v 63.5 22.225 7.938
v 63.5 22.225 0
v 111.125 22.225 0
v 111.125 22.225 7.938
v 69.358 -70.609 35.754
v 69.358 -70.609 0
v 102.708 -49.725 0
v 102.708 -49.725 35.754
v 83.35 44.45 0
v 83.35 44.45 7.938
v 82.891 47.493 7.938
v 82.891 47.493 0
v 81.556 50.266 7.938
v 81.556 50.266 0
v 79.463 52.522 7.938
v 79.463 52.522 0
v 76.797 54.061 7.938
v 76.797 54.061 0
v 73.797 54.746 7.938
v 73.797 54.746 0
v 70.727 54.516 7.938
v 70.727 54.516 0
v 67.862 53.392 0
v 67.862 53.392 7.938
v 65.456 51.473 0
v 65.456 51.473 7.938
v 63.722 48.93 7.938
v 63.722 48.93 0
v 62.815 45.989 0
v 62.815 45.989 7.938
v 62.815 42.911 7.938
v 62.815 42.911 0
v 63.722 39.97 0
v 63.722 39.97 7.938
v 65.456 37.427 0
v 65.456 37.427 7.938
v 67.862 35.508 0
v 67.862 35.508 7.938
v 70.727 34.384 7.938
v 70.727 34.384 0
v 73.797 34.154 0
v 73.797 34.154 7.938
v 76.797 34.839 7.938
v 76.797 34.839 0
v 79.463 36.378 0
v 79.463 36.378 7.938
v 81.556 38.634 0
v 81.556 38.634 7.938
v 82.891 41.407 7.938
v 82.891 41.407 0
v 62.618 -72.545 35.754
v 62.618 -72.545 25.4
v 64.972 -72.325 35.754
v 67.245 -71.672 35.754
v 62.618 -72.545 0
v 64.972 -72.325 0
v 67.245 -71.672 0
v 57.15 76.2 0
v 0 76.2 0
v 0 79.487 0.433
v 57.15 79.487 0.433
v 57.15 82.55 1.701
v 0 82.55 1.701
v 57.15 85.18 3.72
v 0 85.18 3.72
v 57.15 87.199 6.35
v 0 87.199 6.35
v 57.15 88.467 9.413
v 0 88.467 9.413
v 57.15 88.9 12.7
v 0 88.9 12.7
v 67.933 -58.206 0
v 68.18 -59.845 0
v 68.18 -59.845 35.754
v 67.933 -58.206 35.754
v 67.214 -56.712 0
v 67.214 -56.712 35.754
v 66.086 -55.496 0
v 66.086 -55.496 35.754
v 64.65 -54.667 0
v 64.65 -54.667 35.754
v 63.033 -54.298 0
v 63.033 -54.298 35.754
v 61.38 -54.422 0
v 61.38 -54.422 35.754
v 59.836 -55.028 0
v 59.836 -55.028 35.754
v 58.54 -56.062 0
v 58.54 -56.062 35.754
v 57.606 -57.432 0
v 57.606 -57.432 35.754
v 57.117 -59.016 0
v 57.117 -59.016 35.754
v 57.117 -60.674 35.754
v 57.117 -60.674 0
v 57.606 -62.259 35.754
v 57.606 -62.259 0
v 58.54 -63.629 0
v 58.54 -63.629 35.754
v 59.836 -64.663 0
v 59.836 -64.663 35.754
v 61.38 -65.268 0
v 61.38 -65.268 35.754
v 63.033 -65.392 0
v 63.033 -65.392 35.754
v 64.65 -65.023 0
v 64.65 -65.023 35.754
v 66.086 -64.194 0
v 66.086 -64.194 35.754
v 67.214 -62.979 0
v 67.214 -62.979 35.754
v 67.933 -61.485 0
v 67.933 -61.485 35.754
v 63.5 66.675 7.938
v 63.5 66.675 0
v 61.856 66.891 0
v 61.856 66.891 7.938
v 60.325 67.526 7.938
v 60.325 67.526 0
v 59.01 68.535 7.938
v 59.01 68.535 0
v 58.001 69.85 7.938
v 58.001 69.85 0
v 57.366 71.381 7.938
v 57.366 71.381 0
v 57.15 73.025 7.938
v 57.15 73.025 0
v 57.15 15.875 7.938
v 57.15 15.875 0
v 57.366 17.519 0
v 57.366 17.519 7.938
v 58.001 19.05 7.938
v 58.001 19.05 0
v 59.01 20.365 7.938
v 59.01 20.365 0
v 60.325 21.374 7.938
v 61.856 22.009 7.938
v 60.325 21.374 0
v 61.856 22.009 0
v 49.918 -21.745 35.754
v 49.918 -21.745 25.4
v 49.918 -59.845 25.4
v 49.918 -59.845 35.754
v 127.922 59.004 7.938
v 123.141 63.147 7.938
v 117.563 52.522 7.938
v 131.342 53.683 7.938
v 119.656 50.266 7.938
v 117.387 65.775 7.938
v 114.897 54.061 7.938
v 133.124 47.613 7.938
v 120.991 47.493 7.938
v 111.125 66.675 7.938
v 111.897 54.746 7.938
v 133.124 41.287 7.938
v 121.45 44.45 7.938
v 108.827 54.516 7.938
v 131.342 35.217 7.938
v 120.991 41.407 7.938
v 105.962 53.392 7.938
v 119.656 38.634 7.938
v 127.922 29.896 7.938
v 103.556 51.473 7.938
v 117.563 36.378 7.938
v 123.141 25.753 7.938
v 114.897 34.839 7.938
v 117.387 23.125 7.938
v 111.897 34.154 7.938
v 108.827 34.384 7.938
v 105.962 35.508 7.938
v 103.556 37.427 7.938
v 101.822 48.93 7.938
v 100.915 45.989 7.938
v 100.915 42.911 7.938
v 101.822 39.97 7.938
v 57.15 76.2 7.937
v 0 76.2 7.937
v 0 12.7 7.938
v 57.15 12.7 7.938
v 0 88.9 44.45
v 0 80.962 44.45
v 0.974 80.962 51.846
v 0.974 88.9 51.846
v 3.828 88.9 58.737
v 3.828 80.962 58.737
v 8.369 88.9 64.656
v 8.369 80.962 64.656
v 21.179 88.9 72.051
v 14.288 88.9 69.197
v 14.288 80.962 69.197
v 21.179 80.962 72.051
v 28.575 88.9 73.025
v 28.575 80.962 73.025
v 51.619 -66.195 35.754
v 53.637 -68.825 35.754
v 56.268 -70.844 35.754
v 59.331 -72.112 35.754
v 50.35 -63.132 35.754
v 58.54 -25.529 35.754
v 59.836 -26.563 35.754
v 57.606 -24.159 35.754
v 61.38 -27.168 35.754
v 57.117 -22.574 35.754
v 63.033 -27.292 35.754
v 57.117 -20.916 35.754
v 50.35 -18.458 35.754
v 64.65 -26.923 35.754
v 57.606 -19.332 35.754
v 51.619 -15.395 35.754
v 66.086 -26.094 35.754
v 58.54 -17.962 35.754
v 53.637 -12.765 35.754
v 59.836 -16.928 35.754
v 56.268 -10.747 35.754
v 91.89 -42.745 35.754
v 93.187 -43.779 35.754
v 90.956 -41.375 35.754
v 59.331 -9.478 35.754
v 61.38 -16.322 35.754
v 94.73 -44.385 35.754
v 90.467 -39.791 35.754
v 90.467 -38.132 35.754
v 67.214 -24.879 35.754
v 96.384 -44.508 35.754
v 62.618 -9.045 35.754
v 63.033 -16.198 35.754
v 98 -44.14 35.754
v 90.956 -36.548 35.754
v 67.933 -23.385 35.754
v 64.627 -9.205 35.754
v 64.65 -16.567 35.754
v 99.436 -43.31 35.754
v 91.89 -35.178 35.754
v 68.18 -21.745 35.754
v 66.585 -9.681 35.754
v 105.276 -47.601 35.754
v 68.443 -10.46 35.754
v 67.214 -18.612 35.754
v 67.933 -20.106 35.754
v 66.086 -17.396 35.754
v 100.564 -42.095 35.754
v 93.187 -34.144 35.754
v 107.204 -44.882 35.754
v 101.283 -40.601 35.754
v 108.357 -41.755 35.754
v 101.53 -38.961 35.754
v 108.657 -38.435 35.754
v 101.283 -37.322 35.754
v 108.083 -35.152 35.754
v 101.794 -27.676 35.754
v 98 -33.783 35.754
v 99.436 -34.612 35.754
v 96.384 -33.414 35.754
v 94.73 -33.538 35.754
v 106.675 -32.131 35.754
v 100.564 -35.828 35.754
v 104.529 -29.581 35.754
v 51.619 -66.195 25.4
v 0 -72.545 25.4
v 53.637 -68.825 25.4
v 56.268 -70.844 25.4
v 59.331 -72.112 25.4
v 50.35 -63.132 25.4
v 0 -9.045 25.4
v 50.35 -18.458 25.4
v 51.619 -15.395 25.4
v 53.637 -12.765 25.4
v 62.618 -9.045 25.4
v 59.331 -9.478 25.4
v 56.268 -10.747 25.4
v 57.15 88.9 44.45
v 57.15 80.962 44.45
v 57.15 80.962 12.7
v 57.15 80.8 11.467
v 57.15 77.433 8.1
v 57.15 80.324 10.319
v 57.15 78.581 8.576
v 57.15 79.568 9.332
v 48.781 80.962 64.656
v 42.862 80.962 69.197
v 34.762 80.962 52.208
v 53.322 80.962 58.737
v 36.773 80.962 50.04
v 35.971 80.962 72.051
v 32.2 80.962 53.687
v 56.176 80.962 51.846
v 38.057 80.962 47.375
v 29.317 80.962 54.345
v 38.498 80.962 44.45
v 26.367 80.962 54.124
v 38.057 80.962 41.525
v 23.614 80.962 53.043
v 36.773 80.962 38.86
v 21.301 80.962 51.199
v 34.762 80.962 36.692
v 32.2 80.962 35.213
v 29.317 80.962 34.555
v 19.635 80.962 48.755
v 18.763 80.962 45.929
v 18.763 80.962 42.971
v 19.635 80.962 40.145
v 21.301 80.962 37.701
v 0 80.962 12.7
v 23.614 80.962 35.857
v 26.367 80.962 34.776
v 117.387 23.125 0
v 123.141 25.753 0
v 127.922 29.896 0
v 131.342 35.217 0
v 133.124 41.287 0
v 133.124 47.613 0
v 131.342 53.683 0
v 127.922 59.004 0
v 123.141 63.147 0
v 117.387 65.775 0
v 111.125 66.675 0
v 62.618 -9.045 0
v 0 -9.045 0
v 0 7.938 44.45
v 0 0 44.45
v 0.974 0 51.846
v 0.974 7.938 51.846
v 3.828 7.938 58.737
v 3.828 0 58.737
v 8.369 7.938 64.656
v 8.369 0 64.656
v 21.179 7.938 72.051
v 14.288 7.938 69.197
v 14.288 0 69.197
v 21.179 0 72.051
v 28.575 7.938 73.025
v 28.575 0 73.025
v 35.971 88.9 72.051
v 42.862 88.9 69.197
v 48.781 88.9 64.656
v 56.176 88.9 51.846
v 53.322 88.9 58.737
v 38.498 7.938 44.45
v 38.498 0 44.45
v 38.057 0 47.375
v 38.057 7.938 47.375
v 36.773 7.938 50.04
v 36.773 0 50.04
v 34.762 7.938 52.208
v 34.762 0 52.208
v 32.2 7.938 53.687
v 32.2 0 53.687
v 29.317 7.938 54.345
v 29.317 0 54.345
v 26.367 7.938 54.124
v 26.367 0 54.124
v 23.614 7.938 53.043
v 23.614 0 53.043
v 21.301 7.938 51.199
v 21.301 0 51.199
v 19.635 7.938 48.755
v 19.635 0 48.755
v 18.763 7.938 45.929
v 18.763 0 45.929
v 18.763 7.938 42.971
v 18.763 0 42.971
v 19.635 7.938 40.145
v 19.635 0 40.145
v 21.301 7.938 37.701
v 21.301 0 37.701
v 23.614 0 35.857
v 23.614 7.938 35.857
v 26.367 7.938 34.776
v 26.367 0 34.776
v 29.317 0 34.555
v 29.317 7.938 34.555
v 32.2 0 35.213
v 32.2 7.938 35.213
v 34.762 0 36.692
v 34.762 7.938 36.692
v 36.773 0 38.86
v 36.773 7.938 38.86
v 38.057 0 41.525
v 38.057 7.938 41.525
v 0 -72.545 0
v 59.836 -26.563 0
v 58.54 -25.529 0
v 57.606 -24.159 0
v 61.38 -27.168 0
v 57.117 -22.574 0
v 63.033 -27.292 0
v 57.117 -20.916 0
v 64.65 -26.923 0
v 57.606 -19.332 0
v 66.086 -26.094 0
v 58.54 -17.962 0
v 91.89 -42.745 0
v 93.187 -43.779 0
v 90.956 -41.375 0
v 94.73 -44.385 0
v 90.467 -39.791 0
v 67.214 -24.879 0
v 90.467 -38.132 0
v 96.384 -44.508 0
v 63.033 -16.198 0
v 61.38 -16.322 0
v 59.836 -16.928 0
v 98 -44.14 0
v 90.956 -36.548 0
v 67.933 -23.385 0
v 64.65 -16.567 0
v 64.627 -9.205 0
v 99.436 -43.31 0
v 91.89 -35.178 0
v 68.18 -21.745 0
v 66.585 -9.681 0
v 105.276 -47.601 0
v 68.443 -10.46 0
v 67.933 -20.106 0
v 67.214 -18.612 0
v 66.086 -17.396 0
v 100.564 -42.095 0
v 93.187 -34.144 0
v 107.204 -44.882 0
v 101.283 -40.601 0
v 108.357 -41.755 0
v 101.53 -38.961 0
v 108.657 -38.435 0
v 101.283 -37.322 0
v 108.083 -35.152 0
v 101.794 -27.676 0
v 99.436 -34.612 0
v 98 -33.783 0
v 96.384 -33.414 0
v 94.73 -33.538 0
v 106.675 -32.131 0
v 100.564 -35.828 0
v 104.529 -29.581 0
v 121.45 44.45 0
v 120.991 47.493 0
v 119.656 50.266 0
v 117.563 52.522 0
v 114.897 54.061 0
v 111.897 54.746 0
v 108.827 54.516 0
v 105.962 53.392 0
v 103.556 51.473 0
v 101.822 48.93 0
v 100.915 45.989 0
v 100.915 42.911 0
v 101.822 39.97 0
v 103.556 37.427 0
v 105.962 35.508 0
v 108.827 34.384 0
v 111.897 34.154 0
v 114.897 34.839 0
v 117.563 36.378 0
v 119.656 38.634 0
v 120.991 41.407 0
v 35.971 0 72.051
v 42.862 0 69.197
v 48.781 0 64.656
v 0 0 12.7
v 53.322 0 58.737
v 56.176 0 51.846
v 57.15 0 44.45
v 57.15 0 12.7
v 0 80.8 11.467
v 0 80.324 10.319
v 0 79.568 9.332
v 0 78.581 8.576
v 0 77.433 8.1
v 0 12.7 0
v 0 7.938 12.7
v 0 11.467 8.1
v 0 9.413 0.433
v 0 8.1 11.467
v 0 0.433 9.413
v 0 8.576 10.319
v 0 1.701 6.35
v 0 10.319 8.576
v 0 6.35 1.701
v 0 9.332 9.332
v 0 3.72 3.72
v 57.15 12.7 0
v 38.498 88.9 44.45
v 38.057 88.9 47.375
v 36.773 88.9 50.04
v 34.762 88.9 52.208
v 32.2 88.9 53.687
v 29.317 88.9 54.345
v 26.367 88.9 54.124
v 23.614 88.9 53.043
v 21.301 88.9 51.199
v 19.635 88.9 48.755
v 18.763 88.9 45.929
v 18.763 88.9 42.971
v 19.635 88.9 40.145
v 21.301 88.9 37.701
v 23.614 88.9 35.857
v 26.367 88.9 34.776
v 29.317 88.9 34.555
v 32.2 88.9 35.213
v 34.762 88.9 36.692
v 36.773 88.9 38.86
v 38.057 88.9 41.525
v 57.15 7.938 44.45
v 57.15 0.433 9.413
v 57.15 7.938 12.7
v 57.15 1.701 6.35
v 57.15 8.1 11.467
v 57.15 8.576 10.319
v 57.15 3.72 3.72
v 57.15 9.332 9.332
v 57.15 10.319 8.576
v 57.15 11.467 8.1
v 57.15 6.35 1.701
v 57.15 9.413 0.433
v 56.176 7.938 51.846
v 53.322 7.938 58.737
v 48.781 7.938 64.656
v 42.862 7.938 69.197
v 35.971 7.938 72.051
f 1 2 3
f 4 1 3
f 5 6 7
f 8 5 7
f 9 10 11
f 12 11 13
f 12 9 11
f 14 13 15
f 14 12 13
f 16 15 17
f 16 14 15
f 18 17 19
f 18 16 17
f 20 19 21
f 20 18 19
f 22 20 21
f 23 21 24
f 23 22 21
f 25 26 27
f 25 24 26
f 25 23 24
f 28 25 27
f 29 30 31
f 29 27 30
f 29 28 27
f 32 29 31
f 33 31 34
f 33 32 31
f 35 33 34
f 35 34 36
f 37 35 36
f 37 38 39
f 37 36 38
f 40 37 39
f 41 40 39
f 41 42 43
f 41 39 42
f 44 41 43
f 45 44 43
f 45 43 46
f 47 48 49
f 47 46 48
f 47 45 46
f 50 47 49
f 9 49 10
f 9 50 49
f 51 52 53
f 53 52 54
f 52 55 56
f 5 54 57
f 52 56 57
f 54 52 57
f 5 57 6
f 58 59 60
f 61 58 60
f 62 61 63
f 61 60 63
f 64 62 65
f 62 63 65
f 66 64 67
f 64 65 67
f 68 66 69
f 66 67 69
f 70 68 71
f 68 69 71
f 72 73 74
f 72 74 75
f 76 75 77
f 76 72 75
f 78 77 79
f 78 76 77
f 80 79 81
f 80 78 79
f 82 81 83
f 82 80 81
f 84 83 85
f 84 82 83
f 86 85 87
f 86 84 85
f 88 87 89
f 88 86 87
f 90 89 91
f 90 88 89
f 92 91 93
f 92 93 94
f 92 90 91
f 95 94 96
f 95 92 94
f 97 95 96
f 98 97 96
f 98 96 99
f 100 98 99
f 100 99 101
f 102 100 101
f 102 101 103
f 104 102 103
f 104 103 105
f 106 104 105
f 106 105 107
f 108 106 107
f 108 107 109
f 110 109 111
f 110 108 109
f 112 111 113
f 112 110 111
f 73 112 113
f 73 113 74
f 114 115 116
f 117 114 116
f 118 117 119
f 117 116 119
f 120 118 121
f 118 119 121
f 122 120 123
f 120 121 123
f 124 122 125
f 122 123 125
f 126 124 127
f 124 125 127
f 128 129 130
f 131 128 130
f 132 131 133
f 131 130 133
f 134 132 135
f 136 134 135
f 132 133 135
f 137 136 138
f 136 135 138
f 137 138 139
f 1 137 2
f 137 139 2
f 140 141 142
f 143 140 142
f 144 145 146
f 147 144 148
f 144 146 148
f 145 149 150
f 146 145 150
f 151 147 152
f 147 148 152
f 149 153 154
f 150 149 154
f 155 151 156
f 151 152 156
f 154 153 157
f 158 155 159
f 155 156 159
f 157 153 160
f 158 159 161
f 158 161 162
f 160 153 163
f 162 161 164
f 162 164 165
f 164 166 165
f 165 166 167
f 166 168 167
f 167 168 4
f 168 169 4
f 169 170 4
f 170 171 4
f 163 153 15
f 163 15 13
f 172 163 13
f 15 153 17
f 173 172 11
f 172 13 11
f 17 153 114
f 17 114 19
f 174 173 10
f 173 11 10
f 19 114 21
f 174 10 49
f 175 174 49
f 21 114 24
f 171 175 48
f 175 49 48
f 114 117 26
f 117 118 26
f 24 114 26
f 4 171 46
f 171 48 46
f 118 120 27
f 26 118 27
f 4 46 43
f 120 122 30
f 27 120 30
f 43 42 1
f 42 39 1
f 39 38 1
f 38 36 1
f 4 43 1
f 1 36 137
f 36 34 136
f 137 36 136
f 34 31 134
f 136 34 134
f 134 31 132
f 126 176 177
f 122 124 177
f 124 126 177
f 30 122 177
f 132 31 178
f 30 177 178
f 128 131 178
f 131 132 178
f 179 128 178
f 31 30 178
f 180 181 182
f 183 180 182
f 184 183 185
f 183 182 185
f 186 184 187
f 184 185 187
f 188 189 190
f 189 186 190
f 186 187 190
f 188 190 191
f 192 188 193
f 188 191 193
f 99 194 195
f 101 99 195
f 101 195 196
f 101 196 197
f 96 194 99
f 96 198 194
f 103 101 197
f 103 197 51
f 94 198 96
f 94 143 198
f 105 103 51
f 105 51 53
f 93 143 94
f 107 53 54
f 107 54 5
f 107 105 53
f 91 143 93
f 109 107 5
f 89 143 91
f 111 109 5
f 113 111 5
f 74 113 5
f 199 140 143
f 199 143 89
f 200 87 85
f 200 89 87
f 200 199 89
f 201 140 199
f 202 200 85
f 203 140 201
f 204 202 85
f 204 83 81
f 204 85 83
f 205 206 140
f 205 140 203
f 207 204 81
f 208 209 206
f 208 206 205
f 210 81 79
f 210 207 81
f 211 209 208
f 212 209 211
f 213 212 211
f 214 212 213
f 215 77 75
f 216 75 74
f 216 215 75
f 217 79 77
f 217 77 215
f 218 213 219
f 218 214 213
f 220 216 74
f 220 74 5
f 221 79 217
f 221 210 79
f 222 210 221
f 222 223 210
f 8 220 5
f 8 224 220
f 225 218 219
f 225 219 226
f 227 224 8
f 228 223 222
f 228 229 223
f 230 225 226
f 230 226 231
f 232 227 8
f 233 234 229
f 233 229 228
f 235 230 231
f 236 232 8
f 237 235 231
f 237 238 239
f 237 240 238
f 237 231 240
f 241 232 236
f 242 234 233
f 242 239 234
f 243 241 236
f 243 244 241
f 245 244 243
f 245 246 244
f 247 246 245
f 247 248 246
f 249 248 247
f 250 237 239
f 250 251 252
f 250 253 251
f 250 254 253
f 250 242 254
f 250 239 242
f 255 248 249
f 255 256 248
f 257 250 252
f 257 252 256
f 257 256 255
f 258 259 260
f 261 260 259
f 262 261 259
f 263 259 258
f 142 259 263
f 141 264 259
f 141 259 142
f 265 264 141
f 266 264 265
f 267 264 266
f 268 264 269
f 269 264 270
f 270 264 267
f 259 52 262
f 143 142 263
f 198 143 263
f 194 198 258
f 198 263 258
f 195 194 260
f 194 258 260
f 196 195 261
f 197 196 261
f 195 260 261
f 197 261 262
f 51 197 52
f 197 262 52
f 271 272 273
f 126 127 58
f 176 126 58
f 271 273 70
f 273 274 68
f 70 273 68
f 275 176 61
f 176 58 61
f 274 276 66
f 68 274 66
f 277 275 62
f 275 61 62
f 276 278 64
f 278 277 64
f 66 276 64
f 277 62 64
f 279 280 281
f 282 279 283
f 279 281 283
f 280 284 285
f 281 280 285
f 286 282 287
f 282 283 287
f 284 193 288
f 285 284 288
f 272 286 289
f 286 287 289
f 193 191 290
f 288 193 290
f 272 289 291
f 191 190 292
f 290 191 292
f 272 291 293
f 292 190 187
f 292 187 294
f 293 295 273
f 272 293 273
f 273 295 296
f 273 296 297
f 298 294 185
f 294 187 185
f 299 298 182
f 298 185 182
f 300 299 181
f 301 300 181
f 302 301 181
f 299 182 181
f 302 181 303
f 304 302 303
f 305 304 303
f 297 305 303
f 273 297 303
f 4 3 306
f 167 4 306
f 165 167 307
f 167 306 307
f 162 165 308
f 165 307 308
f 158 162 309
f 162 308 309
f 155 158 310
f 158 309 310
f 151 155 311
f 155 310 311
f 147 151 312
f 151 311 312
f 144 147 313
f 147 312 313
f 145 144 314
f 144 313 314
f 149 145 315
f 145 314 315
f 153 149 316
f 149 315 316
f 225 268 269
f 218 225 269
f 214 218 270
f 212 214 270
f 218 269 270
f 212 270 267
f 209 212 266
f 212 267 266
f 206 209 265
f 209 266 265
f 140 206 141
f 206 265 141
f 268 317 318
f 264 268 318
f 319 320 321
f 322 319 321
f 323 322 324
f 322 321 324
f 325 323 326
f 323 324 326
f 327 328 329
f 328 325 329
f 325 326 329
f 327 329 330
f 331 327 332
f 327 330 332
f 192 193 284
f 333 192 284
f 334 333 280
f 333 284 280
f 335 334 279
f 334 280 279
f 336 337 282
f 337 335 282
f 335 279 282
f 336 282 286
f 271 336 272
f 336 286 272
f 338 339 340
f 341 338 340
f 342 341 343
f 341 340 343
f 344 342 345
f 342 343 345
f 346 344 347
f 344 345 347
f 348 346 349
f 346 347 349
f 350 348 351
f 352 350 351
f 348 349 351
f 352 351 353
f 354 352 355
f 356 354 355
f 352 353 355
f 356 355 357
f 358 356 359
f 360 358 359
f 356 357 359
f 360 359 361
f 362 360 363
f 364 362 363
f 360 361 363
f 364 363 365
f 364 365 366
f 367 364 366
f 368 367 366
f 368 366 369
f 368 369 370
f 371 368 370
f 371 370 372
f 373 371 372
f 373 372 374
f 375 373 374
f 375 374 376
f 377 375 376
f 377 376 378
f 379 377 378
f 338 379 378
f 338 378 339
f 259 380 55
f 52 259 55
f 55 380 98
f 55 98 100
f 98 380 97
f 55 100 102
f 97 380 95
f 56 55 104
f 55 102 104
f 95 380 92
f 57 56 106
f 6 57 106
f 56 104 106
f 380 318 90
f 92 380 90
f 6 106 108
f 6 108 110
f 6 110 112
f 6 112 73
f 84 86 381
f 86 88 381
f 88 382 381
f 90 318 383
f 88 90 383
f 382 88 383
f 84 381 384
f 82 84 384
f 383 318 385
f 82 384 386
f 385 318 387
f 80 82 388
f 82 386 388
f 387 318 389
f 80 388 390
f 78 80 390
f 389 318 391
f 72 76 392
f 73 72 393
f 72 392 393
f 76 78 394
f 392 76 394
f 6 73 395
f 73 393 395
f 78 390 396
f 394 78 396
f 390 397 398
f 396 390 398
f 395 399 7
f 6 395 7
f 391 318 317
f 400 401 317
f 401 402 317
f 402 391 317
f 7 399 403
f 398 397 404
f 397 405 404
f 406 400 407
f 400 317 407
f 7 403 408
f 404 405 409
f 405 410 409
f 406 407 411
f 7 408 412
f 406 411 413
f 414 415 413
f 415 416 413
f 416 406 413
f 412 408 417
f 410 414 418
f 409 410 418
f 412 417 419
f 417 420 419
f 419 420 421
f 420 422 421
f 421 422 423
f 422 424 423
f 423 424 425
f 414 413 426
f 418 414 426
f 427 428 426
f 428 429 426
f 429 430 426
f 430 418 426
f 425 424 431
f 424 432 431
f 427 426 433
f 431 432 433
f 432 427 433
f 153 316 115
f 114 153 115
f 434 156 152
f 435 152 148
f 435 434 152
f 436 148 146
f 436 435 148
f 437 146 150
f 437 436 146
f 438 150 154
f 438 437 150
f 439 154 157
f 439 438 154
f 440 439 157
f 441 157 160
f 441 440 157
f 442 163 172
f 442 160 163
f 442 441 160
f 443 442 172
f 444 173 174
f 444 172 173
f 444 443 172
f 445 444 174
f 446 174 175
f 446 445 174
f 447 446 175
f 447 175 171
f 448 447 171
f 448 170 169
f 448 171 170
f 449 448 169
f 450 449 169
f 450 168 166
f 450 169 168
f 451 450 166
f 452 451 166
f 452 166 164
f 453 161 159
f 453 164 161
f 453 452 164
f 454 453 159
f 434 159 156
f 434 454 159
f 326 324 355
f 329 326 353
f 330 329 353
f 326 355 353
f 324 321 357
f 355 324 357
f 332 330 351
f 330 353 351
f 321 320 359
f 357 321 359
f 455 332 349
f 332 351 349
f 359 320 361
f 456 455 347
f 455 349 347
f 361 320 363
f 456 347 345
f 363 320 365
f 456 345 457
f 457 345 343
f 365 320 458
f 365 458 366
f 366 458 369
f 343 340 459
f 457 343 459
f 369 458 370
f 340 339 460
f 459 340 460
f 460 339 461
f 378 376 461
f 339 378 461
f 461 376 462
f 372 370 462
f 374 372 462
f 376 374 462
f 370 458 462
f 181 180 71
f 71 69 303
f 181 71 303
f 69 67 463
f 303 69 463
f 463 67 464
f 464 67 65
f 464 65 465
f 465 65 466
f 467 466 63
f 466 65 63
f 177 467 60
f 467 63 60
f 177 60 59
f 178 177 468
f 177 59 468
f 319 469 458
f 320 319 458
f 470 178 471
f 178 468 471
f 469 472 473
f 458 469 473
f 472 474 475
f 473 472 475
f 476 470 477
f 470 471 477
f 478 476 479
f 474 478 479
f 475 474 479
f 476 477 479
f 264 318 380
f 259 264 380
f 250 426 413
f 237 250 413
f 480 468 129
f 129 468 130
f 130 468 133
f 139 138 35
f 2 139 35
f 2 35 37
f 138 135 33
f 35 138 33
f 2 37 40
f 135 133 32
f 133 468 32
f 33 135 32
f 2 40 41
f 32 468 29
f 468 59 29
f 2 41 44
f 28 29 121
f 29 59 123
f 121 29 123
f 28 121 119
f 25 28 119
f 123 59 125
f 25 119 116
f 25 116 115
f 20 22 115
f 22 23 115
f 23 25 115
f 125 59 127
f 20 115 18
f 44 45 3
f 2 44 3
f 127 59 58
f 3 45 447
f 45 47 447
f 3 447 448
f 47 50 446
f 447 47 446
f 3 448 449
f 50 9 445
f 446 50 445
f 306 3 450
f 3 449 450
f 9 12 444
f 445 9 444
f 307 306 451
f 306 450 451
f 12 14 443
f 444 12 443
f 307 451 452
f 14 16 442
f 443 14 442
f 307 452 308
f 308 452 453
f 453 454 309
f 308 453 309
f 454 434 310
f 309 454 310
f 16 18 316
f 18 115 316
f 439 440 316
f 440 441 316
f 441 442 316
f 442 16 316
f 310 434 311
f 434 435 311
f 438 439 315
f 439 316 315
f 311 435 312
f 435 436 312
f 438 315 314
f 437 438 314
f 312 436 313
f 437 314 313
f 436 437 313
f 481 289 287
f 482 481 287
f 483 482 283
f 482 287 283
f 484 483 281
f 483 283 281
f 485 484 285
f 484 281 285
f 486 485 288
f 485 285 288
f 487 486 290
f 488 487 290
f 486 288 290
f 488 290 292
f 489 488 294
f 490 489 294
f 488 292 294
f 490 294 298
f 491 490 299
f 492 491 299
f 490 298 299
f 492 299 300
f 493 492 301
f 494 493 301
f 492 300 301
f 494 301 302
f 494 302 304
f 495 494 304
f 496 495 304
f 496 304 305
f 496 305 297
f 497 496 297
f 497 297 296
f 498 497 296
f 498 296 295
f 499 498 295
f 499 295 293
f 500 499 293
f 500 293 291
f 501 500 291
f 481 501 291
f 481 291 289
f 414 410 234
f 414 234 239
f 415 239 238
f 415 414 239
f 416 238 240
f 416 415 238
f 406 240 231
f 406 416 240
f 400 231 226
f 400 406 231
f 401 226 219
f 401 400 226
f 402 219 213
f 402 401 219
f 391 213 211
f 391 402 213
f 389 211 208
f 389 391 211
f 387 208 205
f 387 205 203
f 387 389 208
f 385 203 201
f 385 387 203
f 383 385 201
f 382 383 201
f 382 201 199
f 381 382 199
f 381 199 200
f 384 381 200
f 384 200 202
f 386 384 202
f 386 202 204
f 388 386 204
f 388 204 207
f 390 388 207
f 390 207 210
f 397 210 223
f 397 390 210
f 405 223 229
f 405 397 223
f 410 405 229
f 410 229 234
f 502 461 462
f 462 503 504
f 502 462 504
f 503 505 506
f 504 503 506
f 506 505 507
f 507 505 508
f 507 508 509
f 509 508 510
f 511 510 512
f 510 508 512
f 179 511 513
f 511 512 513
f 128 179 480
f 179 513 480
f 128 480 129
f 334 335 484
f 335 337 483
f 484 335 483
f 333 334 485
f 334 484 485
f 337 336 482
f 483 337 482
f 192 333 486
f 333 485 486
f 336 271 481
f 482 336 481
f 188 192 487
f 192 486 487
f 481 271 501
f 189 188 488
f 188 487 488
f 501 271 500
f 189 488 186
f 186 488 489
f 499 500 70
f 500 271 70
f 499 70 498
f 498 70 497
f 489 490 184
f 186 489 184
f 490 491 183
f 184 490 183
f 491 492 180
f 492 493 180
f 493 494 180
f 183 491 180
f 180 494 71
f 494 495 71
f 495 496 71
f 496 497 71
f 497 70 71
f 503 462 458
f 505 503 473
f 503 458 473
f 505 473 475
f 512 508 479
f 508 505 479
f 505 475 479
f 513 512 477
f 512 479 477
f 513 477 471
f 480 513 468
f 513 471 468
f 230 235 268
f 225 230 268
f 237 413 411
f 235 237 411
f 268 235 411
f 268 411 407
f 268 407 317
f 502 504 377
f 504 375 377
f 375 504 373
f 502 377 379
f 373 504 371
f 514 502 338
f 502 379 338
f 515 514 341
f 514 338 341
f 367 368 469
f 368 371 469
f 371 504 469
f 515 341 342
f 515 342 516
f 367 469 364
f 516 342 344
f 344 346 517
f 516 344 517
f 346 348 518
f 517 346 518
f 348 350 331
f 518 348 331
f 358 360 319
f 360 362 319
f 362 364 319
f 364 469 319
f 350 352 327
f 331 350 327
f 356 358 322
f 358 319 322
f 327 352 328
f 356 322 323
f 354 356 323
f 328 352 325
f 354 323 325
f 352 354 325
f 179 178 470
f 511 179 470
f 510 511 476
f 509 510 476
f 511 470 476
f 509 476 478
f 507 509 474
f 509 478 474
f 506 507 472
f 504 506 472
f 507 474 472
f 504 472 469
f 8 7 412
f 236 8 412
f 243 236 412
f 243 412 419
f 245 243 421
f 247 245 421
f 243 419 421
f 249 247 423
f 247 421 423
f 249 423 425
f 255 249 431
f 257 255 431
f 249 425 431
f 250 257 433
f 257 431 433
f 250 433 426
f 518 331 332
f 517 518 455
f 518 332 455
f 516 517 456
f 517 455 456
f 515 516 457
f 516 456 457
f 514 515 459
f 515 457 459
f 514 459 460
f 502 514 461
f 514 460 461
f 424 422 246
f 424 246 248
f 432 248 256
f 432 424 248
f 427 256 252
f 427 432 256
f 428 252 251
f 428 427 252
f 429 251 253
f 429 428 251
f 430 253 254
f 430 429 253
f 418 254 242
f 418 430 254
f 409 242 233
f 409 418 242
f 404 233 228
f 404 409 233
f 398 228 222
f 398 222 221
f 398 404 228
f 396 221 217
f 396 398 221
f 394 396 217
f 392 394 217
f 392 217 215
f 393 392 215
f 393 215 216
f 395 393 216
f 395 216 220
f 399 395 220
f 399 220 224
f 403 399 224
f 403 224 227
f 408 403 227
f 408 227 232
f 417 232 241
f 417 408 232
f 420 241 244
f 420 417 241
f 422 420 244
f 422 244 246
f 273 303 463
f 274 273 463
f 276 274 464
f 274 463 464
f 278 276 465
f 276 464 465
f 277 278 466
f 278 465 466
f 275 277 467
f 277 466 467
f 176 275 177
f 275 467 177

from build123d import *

# Parameters (mm, degrees)
F0_R     = 10.3251
F1_DEPTH = 73.025
F3_DEPTH = 133.351
F4_R     = 9.92251
F5_DEPTH = 88.901
F7_DEPTH = 25.4
F6_R     = 5.5626
F8_DEPTH = 35.75374


with BuildPart() as f1:
    # F0 (on Top) → F1 (new body)
    with BuildSketch(Plane.XY):
        with BuildLine():
            Line((0, 88.9), (0, 0))
            Line((0, 0), (57.15, 0))
            Line((57.15, 0), (57.15, 15.875))
            ThreePointArc((57.15, 15.875), (59.009872, 20.365128), (63.5, 22.225))
            Line((63.5, 22.225), (111.125, 22.225))
            ThreePointArc((111.125, 22.225), (133.35, 44.45), (111.125, 66.675))
            Line((111.125, 66.675), (63.5, 66.675))
            ThreePointArc((63.5, 66.675), (59.009872, 68.534872), (57.15, 73.025))
            Line((57.15, 73.025), (57.15, 88.9))
            Line((57.15, 88.9), (0, 88.9))
        make_face()
        with Locations((73.025, 44.45)):
            Circle(F0_R, mode=Mode.SUBTRACT)
        with Locations((111.125, 44.45)):
            Circle(F0_R, mode=Mode.SUBTRACT)
    extrude(amount=F1_DEPTH)

    # F2 (on face) → F3 (cut, through all)
    with BuildSketch(Plane(origin=(0, 0, 0), x_dir=(0, -1, 0), z_dir=(-1, 0, 0))):
        with BuildLine():
            Line((-7.9375, 73.025), (-80.9625, 73.025))
            Line((-80.9625, 73.025), (-80.9625, 12.7))
            ThreePointArc((-80.9625, 12.7), (-79.567596, 9.332404), (-76.2, 7.9375))
            Line((-76.2, 7.9375), (-12.7, 7.9375))
            ThreePointArc((-12.7, 7.9375), (-9.332404, 9.332404), (-7.9375, 12.7))
            Line((-7.9375, 12.7), (-7.9375, 73.025))
        make_face()
        with BuildLine():
            ThreePointArc((-76.2, 0), (-85.180256, 3.719744), (-88.9, 12.7))
            Line((-88.9, 12.7), (-88.9, 0))
            Line((-88.9, 0), (-76.2, 0))
        make_face()
        with BuildLine():
            ThreePointArc((0, 12.7), (-3.719744, 3.719744), (-12.7, 0))
            Line((-12.7, 0), (0, 0))
            Line((0, 0), (0, 12.7))
        make_face()
    extrude(amount=-F3_DEPTH, mode=Mode.SUBTRACT)

    # F4 (on face) → F5 (cut, through all)
    with BuildSketch(Plane.XZ):
        with Locations((28.575, 44.45)):
            Circle(F4_R)
        with BuildLine():
            Line((57.15, 73.025), (28.575, 73.025))
            ThreePointArc((28.575, 73.025), (48.780576, 64.655576), (57.15, 44.45))
            Line((57.15, 44.45), (57.15, 73.025))
        make_face()
        with BuildLine():
            Line((0, 73.025), (0, 44.45))
            ThreePointArc((0, 44.45), (8.369424, 64.655576), (28.575, 73.025))
            Line((28.575, 73.025), (0, 73.025))
        make_face()
    extrude(amount=-F5_DEPTH, mode=Mode.SUBTRACT)


with BuildPart() as f7:
    # F6 (on Top) → F7 (new body)
    with BuildSketch(Plane.XY):
        with BuildLine():
            Line((62.617697, -9.045224), (0, -9.045224))
            Line((0, -9.045224), (0, -72.545224))
            Line((0, -72.545224), (62.617697, -72.545224))
            ThreePointArc((62.617697, -72.545224), (53.637441, -68.82548), (49.917697, -59.845224))
            Line((49.917697, -59.845224), (49.917697, -21.745224))
            ThreePointArc((49.917697, -21.745224), (53.637441, -12.764968), (62.617697, -9.045224))
        make_face()
    extrude(amount=F7_DEPTH)

    # F6 (on Top) → F8 (join)
    with BuildSketch(Plane.XY):
        with BuildLine():
            ThreePointArc((68.443323, -10.460186), (65.615198, -9.404033), (62.617697, -9.045224))
            ThreePointArc((62.617697, -9.045224), (53.637441, -12.764968), (49.917697, -21.745224))
            Line((49.917697, -21.745224), (49.917697, -59.845224))
            ThreePointArc((49.917697, -59.845224), (53.637441, -68.82548), (62.617697, -72.545224))
            ThreePointArc((62.617697, -72.545224), (66.124113, -72.051577), (69.357941, -70.609011))
            Line((69.357941, -70.609011), (102.708141, -49.72524))
            ThreePointArc((102.708141, -49.72524), (108.656985, -38.435091), (101.793523, -27.676415))
            Line((101.793523, -27.676415), (68.443323, -10.460186))
        make_face()
        with Locations((62.617697, -59.845224)):
            Circle(F6_R, mode=Mode.SUBTRACT)
        with Locations((95.967897, -38.961453)):
            Circle(F6_R, mode=Mode.SUBTRACT)
        with Locations((62.617697, -21.745224)):
            Circle(F6_R, mode=Mode.SUBTRACT)
    extrude(amount=F8_DEPTH)


solid = Compound([f1.part, f7.part])
